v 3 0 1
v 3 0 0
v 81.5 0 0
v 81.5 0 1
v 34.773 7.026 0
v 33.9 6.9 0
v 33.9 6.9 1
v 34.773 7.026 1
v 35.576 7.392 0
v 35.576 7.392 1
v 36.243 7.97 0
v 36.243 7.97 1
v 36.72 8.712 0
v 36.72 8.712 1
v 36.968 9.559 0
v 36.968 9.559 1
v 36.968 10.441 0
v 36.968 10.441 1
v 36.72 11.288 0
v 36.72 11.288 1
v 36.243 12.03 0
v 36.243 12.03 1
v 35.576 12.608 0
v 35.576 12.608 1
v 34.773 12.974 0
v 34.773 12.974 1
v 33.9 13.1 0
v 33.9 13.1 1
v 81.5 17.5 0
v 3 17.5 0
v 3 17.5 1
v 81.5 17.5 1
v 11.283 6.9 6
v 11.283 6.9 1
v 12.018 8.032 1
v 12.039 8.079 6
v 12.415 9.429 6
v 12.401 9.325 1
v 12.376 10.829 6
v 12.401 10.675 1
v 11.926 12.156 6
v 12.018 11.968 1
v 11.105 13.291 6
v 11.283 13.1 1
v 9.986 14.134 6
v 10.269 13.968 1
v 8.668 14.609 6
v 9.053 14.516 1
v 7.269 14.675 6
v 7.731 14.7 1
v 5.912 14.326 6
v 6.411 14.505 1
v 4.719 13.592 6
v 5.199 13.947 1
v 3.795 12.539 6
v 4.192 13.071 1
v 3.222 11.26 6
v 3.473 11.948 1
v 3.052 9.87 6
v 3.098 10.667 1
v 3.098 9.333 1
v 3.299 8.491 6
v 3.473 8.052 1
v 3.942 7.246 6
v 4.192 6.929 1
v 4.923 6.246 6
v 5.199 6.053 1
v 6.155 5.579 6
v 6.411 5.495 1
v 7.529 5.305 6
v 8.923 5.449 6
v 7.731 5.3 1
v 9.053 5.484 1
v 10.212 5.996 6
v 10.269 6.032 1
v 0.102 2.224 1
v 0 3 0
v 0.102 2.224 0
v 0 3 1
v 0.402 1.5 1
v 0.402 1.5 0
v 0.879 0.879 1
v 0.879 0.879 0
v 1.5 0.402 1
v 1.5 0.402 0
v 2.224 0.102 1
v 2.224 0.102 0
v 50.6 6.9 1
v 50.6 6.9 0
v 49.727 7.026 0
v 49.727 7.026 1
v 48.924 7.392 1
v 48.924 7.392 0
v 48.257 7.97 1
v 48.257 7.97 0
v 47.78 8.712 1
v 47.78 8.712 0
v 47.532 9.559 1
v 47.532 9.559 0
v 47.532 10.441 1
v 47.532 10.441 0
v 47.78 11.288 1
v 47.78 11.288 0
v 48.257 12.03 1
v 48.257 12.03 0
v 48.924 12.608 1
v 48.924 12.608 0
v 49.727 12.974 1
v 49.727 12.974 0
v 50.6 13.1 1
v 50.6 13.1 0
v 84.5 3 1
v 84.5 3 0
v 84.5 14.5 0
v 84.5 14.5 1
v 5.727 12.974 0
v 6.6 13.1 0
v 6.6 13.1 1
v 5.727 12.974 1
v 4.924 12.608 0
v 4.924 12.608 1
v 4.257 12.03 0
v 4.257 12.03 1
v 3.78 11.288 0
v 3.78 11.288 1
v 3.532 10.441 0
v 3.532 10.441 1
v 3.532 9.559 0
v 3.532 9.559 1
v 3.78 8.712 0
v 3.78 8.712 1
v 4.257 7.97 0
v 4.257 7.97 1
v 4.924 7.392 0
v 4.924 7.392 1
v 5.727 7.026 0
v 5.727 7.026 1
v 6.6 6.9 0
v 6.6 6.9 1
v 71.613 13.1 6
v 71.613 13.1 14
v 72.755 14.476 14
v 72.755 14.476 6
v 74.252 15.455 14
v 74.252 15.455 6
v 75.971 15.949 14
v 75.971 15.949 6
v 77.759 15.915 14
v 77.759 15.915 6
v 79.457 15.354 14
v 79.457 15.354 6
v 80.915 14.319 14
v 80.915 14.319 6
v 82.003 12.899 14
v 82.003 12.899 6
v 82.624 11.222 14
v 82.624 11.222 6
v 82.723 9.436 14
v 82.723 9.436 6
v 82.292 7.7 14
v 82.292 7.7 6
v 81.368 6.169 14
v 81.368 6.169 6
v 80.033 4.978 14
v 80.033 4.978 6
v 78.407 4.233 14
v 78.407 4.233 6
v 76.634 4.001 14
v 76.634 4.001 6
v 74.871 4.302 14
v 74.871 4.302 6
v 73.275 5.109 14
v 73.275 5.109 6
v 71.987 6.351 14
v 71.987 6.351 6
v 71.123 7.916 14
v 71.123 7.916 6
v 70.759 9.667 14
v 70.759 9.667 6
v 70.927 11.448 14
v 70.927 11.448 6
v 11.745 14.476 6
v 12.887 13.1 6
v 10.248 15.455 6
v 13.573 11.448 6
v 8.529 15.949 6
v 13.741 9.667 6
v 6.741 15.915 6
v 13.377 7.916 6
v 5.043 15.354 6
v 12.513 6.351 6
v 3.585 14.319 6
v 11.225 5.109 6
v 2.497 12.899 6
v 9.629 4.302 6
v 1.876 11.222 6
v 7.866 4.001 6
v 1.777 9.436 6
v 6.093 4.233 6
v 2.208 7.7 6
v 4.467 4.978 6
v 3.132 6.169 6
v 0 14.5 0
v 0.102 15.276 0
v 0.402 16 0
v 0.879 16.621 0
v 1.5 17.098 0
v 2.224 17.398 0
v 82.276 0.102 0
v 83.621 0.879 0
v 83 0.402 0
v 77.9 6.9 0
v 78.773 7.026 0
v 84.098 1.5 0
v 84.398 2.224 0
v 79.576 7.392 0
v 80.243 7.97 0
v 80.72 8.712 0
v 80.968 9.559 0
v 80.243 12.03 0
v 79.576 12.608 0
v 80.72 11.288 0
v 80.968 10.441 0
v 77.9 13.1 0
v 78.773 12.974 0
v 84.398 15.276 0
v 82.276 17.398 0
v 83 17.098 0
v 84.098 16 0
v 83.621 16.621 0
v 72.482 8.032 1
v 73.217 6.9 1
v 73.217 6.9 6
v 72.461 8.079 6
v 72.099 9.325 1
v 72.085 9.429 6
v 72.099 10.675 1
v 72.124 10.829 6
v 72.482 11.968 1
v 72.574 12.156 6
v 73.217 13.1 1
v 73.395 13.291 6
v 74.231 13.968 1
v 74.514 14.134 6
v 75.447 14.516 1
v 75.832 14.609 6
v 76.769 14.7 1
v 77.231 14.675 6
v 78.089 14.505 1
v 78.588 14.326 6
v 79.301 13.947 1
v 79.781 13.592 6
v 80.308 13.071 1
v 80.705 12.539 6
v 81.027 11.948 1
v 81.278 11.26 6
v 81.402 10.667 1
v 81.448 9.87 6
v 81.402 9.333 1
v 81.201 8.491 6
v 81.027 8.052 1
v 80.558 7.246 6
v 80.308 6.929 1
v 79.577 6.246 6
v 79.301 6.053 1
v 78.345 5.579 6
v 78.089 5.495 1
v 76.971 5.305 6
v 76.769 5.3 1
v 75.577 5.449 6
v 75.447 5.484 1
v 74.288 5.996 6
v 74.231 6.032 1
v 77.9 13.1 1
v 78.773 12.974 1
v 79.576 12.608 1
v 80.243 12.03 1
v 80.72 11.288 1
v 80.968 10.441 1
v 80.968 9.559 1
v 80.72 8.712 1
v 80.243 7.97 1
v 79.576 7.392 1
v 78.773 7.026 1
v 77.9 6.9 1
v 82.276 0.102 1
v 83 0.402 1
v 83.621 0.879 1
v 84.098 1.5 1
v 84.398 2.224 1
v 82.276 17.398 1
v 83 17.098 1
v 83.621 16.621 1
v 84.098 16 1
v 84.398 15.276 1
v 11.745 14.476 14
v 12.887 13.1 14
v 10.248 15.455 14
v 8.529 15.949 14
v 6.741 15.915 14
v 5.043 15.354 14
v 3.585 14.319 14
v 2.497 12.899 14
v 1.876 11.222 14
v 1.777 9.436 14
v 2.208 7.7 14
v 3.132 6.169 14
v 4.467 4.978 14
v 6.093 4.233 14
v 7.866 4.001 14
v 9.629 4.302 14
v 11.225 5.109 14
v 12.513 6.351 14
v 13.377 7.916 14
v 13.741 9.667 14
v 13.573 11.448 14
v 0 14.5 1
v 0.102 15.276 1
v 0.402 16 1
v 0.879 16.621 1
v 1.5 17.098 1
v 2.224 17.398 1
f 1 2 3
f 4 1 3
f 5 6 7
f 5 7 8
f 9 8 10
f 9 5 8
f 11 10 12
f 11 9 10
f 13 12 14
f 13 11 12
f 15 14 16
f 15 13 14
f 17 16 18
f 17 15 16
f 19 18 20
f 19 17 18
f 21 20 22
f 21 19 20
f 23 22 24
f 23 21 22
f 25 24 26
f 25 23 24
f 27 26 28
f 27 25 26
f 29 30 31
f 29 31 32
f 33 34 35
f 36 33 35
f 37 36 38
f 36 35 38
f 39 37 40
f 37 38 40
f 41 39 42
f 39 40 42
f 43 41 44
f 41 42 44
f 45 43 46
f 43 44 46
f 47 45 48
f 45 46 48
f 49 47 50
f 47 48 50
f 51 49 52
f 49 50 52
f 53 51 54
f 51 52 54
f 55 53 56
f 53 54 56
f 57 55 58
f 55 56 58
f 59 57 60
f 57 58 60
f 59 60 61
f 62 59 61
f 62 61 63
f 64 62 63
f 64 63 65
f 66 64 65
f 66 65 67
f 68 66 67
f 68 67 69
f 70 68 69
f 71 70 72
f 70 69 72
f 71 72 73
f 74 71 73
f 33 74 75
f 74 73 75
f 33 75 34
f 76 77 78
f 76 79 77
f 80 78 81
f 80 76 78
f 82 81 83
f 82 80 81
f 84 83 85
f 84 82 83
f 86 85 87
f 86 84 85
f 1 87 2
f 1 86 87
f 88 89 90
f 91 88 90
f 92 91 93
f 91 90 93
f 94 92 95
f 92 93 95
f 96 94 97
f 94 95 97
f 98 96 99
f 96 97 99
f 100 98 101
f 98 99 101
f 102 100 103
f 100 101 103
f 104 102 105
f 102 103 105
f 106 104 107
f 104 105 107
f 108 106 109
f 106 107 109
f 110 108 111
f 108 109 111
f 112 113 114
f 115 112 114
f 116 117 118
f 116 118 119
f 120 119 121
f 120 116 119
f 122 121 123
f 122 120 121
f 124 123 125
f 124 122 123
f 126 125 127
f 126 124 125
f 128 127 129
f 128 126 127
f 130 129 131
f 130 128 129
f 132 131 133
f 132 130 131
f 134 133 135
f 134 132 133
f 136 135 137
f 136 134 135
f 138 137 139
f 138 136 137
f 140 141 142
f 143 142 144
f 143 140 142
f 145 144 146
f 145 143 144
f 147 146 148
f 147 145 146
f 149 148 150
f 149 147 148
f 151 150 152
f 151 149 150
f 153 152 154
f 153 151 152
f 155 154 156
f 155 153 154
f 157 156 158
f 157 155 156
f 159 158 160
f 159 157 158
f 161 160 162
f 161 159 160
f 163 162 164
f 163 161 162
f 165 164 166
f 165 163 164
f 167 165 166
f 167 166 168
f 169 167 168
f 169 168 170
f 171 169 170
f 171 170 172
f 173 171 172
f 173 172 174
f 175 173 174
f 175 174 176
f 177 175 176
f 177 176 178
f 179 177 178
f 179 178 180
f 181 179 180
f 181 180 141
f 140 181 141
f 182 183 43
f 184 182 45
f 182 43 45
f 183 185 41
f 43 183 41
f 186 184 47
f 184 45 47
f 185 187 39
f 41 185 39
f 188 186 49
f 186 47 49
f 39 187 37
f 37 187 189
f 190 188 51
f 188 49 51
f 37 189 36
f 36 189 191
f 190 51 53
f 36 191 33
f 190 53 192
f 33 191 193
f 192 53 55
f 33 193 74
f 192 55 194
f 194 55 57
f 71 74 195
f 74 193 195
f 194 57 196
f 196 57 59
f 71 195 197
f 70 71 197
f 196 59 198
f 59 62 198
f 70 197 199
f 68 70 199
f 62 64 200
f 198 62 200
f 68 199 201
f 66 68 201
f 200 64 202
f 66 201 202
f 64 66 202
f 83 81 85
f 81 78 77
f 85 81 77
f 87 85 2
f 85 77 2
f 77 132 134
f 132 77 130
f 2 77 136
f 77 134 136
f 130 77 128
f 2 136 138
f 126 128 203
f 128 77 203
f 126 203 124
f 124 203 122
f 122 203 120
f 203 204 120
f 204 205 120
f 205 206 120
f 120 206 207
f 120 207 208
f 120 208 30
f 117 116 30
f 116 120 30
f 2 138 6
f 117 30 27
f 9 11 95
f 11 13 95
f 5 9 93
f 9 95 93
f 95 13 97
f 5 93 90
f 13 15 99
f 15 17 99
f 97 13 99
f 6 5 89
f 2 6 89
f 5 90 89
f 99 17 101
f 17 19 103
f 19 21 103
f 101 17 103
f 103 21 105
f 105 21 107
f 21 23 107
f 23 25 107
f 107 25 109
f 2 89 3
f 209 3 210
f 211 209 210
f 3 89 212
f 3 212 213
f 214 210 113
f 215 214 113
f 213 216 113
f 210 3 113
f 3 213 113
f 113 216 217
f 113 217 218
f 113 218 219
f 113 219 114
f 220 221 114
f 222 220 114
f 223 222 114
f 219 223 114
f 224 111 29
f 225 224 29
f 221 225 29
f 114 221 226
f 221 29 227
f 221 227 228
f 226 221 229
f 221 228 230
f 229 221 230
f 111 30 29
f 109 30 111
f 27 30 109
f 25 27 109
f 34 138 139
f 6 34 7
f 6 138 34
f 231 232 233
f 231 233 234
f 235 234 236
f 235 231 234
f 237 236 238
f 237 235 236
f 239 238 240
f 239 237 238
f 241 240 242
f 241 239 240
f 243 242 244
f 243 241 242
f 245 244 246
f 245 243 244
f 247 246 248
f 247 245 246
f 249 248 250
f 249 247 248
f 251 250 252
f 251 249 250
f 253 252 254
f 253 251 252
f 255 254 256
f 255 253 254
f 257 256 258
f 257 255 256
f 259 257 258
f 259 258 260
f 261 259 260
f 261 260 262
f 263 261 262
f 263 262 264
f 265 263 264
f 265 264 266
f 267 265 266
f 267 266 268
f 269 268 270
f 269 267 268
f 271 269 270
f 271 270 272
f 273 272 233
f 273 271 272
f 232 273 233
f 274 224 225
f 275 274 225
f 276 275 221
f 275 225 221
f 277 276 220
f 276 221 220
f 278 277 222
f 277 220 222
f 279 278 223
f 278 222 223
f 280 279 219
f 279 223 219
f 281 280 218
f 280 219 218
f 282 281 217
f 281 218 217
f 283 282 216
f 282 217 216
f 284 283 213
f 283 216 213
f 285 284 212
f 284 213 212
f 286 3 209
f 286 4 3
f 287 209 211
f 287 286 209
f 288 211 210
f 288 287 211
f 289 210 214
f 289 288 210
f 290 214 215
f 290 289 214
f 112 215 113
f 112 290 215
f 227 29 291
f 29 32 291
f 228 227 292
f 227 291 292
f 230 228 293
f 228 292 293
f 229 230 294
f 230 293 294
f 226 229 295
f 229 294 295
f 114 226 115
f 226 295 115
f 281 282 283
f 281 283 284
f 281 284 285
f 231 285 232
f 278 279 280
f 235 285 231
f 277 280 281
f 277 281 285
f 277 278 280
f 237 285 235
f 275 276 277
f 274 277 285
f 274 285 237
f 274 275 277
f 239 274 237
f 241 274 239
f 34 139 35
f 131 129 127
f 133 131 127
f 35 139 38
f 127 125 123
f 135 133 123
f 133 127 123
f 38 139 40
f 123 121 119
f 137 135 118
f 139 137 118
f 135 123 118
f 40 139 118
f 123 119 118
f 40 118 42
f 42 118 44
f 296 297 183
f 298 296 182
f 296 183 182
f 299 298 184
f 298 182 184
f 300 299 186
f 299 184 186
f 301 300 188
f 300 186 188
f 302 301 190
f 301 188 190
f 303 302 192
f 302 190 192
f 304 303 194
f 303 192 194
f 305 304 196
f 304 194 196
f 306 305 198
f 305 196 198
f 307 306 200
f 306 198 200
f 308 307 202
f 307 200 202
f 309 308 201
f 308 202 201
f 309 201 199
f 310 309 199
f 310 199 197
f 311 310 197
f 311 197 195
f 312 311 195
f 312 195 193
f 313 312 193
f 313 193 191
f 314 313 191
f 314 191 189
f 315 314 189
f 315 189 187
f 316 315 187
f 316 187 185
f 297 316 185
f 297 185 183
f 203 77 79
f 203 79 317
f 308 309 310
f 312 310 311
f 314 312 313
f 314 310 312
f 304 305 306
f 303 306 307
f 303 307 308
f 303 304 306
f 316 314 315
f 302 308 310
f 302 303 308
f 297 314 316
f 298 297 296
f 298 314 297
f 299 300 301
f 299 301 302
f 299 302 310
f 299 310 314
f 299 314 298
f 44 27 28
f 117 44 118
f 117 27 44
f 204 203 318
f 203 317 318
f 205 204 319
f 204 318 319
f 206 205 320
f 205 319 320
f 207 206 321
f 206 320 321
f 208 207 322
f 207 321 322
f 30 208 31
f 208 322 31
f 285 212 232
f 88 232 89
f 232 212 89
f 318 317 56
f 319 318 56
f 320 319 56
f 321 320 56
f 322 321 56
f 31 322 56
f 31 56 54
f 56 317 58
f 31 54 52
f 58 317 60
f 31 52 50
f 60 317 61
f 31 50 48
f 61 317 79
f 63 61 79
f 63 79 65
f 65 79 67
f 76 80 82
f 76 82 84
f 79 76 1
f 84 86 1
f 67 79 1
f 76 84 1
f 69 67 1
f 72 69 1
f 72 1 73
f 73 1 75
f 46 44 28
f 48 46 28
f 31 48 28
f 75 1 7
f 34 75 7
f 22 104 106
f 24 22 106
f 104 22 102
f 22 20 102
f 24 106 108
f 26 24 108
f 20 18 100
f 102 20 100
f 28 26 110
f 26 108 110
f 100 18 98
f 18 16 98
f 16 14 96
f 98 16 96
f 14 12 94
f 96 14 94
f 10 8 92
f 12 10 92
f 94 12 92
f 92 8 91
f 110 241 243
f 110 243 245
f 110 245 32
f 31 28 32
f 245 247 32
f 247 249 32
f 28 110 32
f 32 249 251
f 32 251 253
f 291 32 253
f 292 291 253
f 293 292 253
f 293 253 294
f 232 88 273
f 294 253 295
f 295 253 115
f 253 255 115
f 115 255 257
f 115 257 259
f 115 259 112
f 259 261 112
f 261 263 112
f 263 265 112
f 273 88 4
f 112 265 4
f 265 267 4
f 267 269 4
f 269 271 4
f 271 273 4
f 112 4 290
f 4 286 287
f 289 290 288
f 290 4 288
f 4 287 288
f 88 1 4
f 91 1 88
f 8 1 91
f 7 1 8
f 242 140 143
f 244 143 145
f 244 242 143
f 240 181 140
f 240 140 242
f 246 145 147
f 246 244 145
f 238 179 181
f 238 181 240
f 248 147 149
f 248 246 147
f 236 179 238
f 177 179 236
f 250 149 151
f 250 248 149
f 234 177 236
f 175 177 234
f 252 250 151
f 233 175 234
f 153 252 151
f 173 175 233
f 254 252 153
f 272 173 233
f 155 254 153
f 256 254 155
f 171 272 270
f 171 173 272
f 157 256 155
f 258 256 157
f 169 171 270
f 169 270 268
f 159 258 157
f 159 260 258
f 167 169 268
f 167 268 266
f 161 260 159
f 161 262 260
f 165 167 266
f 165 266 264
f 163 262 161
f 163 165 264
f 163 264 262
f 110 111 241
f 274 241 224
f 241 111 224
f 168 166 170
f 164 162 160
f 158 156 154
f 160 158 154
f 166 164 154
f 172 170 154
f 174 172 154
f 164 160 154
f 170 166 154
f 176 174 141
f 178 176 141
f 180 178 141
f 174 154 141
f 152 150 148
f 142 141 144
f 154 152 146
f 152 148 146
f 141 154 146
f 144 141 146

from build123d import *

# Parameters (mm, degrees)
SKETCH1_W           = 84.5
SKETCH1_H           = 17.5
BOSS_EXTRUDE1_DEPTH = 1
FILLET1_R           = 3
SKETCH2_R           = 6
BOSS_EXTRUDE2_DEPTH = 13
SKETCH4_R           = 6
SKETCH4_R_2         = 4.7
CUT_EXTRUDE1_DEPTH  = 5


with BuildPart() as part:
    # Sketch1 → Boss-Extrude1 (new body)
    with BuildSketch(Plane.XY):
        with Locations((42.25, 8.75)):
            Rectangle(SKETCH1_W, SKETCH1_H)
        with BuildLine():
            Line((50.6, 13.1), (77.9, 13.1))
            ThreePointArc((77.9, 13.1), (81, 10), (77.9, 6.9))
            Line((77.9, 6.9), (50.6, 6.9))
            ThreePointArc((50.6, 6.9), (47.5, 10), (50.6, 13.1))
        make_face(mode=Mode.SUBTRACT)
        with BuildLine():
            Line((33.9, 13.1), (6.6, 13.1))
            ThreePointArc((6.6, 13.1), (3.5, 10), (6.6, 6.9))
            Line((6.6, 6.9), (33.9, 6.9))
            ThreePointArc((33.9, 6.9), (37, 10), (33.9, 13.1))
        make_face(mode=Mode.SUBTRACT)
    extrude(amount=BOSS_EXTRUDE1_DEPTH)

    # Fillet1
    fillet1_edges = [part.edges().sort_by_distance(p)[0] for p in [
        (0, 17.5, 0.5),
        (84.5, 17.5, 0.5),
        (84.5, 0, 0.5),
        (0, 0, 0.5),
    ]]
    fillet(fillet1_edges, radius=FILLET1_R)

    # Sketch2 → Boss-Extrude2 (add)
    with BuildSketch(Plane.XY.offset(1)):
        with Locations(Location((7.75, 10, 0), (0, 0, 31.108922511))):
            Circle(SKETCH2_R)
    boss_extrude2 = extrude(amount=BOSS_EXTRUDE2_DEPTH)

    # Sketch4 → Cut-Extrude1 (cut)
    with BuildSketch(Plane.XY.offset(1)):
        with Locations(Location((7.75, 10, 0), (0, 0, 180))):
            Circle(SKETCH4_R)
        with Locations(Location((7.75, 10, 0), (0, 0, 318.732572619))):
            Circle(SKETCH4_R_2, mode=Mode.SUBTRACT)
    cut_extrude1 = extrude(amount=CUT_EXTRUDE1_DEPTH, mode=Mode.SUBTRACT)

    # Mirror1: Boss-Extrude2, Cut-Extrude1 across plane
    add(boss_extrude2.mirror(Plane(origin=(42.25, 0, 0), x_dir=(0, 0, 1), z_dir=(1, 0, 0))))
    add(cut_extrude1.mirror(Plane(origin=(42.25, 0, 0), x_dir=(0, 0, 1), z_dir=(1, 0, 0))), mode=Mode.SUBTRACT)


solid = part.part
